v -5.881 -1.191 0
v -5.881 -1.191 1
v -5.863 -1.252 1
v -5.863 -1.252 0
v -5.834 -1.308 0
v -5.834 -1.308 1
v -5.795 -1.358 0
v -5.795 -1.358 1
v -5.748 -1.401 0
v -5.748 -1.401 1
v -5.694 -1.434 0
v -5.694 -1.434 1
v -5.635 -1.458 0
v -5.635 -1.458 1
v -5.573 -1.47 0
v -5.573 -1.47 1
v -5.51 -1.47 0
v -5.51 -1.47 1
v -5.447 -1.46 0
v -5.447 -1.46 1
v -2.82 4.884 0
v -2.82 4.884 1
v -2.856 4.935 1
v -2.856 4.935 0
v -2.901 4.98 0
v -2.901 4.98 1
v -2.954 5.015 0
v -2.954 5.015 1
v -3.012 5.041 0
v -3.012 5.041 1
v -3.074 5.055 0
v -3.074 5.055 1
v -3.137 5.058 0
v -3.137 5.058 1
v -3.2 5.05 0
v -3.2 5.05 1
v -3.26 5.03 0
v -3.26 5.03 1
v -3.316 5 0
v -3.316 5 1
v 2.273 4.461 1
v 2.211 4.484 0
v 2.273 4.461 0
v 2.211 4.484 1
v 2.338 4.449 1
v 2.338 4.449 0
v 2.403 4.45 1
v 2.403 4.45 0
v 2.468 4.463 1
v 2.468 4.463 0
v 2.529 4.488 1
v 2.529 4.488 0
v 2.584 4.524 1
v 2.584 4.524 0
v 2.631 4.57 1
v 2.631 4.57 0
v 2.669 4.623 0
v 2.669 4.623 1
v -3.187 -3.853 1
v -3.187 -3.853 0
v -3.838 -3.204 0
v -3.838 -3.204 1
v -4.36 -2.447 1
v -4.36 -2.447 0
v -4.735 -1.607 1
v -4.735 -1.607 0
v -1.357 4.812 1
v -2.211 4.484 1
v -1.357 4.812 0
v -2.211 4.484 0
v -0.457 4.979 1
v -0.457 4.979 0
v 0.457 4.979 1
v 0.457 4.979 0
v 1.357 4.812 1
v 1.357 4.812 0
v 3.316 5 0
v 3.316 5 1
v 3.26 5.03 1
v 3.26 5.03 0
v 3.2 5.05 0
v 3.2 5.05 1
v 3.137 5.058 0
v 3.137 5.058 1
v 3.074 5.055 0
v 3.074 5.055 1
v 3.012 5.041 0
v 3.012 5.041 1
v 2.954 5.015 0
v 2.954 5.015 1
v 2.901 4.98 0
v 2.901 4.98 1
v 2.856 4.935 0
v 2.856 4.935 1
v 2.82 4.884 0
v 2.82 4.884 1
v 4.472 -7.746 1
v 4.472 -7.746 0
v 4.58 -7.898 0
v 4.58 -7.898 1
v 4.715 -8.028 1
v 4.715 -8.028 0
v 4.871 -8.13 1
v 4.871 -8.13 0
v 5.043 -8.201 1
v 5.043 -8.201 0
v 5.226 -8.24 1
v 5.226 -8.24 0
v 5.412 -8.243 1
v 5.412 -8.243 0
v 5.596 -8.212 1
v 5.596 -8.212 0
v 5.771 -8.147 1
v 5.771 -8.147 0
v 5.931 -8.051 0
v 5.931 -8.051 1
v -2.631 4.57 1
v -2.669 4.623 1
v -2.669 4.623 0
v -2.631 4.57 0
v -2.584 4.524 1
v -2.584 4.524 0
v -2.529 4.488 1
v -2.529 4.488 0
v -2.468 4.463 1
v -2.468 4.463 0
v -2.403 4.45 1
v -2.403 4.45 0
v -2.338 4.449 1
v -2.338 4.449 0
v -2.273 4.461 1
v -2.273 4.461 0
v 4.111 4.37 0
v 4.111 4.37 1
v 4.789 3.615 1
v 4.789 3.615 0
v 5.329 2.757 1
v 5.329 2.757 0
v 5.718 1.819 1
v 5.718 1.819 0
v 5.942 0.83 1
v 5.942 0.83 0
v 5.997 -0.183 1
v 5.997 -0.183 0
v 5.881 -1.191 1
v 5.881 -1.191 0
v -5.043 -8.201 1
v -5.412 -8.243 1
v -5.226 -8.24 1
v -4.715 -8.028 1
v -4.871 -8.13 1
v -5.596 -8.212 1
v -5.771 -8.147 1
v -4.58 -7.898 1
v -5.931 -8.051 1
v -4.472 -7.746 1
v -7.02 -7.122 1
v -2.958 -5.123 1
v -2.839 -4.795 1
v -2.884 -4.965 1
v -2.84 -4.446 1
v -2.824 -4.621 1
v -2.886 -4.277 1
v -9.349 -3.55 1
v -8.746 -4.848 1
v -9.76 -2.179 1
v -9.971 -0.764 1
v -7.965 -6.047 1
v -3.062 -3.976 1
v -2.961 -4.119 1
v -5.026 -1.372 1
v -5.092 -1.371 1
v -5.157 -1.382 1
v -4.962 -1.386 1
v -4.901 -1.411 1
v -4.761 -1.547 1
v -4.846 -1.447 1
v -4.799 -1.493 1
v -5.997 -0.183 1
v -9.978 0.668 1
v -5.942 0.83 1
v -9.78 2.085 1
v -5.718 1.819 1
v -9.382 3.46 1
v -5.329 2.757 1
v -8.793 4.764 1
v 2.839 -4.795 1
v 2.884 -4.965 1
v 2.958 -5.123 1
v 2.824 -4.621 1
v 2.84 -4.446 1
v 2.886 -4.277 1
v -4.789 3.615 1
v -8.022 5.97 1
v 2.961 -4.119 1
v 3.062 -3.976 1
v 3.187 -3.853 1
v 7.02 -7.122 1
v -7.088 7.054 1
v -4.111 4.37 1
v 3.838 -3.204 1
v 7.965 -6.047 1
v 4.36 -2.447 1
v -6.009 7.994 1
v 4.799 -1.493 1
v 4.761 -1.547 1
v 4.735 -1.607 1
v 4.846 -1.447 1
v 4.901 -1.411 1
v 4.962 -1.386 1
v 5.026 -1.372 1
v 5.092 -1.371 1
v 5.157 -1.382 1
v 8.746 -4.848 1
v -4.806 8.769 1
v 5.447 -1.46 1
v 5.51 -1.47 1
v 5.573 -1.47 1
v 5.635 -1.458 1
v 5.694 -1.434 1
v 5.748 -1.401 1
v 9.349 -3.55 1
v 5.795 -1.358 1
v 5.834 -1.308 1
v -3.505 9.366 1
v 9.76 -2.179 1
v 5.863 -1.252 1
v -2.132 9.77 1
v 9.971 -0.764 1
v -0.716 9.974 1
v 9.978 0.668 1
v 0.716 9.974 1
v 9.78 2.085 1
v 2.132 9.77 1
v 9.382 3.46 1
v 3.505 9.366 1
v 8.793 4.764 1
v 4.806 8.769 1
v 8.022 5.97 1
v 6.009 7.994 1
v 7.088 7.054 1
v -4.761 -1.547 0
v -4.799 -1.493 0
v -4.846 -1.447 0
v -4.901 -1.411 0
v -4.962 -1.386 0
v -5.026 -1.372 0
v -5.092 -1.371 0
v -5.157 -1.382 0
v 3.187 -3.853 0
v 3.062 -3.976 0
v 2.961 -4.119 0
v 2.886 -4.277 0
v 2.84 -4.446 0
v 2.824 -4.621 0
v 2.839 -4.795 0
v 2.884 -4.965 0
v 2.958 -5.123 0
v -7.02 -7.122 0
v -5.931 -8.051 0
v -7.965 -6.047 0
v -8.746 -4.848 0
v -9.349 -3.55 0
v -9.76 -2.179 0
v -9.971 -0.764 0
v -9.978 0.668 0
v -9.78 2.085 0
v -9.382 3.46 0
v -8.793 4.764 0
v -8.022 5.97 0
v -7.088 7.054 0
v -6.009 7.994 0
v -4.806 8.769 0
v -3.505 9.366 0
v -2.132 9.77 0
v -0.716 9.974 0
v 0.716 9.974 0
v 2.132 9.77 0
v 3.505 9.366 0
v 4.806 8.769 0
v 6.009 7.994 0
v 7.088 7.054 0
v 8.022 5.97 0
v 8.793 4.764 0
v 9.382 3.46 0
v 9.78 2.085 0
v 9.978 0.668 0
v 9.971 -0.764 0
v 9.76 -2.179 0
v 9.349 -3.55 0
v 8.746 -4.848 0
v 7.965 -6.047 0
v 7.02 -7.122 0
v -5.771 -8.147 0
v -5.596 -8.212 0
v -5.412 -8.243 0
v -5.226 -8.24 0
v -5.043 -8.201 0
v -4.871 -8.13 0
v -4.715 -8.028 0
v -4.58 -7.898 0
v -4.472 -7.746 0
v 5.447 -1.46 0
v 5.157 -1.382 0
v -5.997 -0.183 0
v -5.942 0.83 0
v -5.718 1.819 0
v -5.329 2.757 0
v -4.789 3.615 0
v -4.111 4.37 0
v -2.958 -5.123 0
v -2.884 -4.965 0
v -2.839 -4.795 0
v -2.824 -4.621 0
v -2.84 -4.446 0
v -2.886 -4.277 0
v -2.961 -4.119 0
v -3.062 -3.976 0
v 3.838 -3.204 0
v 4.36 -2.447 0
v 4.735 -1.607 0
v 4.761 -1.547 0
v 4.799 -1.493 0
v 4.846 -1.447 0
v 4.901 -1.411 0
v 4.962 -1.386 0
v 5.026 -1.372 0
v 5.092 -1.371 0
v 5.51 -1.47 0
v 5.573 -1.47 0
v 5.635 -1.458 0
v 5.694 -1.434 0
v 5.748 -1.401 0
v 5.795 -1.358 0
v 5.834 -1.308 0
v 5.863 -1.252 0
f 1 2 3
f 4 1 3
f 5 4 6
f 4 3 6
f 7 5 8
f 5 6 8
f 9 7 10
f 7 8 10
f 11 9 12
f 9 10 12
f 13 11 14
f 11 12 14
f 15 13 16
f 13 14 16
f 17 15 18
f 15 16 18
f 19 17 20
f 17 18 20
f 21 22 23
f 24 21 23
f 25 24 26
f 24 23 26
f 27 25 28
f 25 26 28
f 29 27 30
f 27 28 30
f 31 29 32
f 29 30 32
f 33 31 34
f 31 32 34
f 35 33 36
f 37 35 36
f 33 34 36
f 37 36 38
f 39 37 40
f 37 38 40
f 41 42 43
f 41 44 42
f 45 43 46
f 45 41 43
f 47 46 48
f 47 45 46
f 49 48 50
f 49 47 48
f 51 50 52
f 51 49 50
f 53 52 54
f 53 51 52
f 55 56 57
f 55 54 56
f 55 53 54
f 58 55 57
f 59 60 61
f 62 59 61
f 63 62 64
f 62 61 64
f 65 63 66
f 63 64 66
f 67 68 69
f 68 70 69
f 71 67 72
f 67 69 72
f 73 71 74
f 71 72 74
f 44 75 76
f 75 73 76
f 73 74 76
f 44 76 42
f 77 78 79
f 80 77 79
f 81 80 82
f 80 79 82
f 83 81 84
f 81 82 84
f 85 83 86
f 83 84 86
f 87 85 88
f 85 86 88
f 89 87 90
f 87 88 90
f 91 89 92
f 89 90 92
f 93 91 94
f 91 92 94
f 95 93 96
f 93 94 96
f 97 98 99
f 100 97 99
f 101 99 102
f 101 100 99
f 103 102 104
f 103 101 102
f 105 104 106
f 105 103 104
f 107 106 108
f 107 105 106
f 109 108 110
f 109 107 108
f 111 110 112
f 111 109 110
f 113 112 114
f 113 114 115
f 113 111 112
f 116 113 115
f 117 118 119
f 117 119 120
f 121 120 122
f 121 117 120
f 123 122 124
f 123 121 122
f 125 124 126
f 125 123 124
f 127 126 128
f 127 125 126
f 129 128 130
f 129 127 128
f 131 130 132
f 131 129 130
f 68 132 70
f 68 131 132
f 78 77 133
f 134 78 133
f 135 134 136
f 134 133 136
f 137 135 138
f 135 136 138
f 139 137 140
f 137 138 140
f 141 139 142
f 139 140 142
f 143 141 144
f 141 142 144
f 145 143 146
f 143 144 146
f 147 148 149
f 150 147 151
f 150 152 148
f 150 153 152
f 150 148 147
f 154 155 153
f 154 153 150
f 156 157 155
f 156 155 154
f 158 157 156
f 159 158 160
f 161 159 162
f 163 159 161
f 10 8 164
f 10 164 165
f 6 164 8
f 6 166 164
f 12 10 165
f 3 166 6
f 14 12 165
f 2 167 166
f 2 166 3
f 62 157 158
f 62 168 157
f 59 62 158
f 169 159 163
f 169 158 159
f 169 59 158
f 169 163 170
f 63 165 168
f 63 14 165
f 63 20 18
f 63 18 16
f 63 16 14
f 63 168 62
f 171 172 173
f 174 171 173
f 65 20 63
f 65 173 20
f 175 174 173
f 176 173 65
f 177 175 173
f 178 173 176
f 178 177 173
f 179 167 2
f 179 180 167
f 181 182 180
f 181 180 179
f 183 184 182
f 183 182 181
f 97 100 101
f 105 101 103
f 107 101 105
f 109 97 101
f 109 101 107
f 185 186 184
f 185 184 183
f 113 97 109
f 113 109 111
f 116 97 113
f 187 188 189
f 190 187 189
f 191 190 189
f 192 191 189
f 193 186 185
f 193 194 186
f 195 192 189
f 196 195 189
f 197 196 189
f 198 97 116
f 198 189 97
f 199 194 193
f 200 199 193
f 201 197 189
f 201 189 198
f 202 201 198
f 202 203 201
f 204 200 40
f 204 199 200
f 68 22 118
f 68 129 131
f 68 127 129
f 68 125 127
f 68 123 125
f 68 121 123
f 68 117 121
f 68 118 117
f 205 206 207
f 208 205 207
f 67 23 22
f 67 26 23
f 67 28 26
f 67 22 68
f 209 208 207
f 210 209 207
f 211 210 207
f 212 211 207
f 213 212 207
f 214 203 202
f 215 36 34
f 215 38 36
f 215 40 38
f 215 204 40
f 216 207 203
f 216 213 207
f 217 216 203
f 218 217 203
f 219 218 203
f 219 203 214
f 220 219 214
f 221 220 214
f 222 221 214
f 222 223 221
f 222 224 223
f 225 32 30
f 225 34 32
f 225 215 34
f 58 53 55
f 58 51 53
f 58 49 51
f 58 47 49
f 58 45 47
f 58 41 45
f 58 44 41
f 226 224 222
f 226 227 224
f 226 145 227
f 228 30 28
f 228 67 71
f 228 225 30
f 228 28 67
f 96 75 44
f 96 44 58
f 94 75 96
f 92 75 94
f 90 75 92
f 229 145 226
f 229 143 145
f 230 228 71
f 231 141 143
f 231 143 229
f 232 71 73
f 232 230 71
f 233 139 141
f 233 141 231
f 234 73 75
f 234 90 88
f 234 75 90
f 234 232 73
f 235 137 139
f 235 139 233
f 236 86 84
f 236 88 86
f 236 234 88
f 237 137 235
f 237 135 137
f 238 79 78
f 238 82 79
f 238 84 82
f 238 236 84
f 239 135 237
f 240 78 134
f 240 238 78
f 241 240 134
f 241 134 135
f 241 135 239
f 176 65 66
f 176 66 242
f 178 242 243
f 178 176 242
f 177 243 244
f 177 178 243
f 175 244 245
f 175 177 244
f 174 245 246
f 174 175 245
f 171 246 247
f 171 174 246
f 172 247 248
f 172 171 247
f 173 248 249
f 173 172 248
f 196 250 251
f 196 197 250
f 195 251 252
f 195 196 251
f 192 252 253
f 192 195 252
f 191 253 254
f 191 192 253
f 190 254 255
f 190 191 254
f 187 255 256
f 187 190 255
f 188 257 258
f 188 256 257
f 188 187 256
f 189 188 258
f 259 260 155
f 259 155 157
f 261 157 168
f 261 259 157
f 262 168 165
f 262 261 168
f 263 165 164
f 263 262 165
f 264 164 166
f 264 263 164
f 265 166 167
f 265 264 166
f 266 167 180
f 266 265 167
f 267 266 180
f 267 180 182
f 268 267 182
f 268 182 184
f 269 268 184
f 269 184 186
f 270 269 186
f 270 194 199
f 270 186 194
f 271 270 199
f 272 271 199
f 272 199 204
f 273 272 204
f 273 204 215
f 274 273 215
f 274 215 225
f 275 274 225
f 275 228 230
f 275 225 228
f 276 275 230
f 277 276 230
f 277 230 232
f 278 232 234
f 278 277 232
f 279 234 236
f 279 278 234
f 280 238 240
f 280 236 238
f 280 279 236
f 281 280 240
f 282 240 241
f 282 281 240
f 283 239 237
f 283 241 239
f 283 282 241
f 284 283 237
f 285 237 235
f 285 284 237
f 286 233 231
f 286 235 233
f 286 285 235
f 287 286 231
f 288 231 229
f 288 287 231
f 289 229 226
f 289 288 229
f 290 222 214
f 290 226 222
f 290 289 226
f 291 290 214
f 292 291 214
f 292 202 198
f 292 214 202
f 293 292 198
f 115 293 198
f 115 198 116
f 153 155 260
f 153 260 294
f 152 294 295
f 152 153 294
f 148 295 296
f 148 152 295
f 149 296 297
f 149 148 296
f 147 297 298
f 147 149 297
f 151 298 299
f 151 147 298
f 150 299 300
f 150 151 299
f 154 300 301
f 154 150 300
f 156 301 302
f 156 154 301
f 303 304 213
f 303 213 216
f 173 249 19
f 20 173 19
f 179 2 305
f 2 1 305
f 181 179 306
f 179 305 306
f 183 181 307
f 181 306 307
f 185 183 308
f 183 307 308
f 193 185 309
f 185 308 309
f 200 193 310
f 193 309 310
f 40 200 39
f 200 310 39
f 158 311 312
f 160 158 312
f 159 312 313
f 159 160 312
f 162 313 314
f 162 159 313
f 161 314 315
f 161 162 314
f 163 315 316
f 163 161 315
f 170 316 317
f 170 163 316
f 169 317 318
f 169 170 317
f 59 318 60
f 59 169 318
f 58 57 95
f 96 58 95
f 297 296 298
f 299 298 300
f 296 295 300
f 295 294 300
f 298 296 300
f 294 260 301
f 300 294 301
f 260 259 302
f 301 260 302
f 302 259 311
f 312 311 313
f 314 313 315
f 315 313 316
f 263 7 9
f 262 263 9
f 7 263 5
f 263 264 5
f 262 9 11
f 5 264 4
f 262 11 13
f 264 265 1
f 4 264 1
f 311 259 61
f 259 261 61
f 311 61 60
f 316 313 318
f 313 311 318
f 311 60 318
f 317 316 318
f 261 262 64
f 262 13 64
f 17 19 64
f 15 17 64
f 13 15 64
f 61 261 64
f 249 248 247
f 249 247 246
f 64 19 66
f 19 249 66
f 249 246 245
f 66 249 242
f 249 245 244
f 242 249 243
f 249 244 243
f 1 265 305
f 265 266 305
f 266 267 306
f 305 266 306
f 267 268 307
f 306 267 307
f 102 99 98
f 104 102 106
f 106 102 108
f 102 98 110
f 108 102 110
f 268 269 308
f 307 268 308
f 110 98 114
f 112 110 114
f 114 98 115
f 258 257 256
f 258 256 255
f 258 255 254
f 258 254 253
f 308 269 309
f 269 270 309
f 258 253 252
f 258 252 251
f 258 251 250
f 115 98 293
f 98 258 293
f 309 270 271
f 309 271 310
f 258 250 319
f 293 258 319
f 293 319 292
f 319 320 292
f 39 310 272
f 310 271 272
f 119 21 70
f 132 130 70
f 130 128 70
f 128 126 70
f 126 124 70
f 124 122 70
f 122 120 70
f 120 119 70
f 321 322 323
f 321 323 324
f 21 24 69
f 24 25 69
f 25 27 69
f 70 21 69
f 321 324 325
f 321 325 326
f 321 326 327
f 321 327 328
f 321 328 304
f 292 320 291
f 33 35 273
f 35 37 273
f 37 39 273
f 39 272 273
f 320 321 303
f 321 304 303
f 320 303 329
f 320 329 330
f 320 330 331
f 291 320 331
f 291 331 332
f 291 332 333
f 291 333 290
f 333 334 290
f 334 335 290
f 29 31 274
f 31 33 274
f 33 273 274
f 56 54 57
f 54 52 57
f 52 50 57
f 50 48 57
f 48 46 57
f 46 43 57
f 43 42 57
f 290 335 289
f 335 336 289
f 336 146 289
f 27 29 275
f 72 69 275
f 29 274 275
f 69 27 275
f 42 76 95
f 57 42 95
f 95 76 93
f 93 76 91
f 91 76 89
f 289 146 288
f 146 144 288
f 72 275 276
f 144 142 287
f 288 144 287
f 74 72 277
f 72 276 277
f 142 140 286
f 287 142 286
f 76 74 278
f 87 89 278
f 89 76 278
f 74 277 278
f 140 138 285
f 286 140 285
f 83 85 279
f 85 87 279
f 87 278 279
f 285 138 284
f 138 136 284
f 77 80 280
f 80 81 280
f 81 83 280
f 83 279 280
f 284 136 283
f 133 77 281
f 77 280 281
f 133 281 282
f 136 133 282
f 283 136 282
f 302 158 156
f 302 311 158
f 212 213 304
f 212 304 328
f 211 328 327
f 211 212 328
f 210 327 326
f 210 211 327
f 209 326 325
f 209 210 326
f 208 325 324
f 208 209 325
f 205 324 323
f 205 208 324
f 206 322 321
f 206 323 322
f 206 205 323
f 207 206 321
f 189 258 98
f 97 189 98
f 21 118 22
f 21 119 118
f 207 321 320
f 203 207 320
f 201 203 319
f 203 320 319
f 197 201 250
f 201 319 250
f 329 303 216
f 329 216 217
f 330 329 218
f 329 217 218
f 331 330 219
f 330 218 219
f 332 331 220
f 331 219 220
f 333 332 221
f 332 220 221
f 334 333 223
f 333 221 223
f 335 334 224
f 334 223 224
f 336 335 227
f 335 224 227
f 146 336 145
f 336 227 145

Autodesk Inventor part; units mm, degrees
ref_plane "YZ Plane" through (0, 0, 0) normal (1, 0, 0) x (0, 1, 0)
ref_plane "XZ Plane" through (0, 0, 0) normal (0, 1, 0) x (-1, 0, 0)
ref_plane "XY Plane" through (0, 0, 0) normal (0, 0, 1) x (1, 0, 0)
sketch "Esboço1" plane through (0, 0, 0) normal (0, 0, 1) x (1, 0, 0)
  arc A0 (5, -8.6603) -> (-5, -8.6603) centre (0, 0) ccw
  line L0 (0, 0) -> (3, 0)
  line L1 (0, 0) -> (3, 0) construction
  line L2 (-2.5, -4.3301) -> (-5, -8.6603)
  line L3 (2.5, -4.3301) -> (5, -8.6603)
  line L4 (-2.5, 4.3301) -> (-3, 5.1962)
  line L5 (2.5, 4.3301) -> (3, 5.1962)
  arc A1 (-3, 5.1962) -> (-5.7956, -1.5529) centre (0, 0) ccw
  arc A2 (5.7956, -1.5529) -> (3, 5.1962) centre (0, 0) ccw
  arc A3 (-4.8296, -1.2941) -> (-2.5, -4.3301) centre (0, 0) ccw
  arc A4 (2.5, -4.3301) -> (4.8296, -1.2941) centre (0, 0) ccw
  arc A5 (2.5, 4.3301) -> (-2.5, 4.3301) centre (0, 0) ccw
  line L6 (-4.8296, -1.2941) -> (-5.7956, -1.5529)
  line L7 (4.8296, -1.2941) -> (5.7956, -1.5529)
  dimension "d3" = 3
  dimension "d4" = 0
  dimension "d5" = 60
  dimension "d6" = 60
  dimension "d9" = 45
  dimension "d10" = 45
  dimension "d11" = 5
  dimension "d12" = 5
  dimension "d13" = 6
  dimension "d14" = 6
  dimension "d15" = 5
  dimension "d20" = 4
extrude "Placa1" add sketch "Esboço1" along normal blind 1
fillet "Arredondamento de canto1" radius 1 4 edges at (-2.5, -4.3301, 0.5) (-5, -8.6603, 0.5) (5, -8.6603, 0.5) (2.5, -4.3301, 0.5)
fillet "Arredondamento de canto2" radius 0.35 8 edges at (-4.8296, -1.2941, 0.5) (-5.7956, -1.5529, 0.5) (-2.5, 4.3301, 0.5) (-3, 5.1962, 0.5) (2.5, 4.3301, 0.5) (3, 5.1962, 0.5) (5.7956, -1.5529, 0.5) (4.8296, -1.2941, 0.5)
equation "\"d12\" = d15"
equation "\"d13\" = d14"
equation "\"d15\" = d11"
equation "\"Raio_dobra\" = Espessura"
equation "\"Largura_alívio_de_dobra\" = Espessura"
equation "\"Profundidade_alívio_de_dobra\" = 0.5 * Espessura"
equation "\"Tamanho_alívio_de_dobra\" = 4 * Espessura"
equation "\"Remanescente_mínimo\" = 2 * Espessura"
equation "\"Raiodetransição\" = Raio_dobra"
equation "\"Tamanho_de_raio_de_Jacobi\" = Raio_dobra"
equation "\"TamanhoFolga\" = Espessura"
equation "\"d8\" = d7"
equation "\"d17\" = Raio_dobra"
equation "\"Espessura\" = 1"
equation "\"d7\" = 45deg"
properties part number "anel_elastico" material "Padrão"
